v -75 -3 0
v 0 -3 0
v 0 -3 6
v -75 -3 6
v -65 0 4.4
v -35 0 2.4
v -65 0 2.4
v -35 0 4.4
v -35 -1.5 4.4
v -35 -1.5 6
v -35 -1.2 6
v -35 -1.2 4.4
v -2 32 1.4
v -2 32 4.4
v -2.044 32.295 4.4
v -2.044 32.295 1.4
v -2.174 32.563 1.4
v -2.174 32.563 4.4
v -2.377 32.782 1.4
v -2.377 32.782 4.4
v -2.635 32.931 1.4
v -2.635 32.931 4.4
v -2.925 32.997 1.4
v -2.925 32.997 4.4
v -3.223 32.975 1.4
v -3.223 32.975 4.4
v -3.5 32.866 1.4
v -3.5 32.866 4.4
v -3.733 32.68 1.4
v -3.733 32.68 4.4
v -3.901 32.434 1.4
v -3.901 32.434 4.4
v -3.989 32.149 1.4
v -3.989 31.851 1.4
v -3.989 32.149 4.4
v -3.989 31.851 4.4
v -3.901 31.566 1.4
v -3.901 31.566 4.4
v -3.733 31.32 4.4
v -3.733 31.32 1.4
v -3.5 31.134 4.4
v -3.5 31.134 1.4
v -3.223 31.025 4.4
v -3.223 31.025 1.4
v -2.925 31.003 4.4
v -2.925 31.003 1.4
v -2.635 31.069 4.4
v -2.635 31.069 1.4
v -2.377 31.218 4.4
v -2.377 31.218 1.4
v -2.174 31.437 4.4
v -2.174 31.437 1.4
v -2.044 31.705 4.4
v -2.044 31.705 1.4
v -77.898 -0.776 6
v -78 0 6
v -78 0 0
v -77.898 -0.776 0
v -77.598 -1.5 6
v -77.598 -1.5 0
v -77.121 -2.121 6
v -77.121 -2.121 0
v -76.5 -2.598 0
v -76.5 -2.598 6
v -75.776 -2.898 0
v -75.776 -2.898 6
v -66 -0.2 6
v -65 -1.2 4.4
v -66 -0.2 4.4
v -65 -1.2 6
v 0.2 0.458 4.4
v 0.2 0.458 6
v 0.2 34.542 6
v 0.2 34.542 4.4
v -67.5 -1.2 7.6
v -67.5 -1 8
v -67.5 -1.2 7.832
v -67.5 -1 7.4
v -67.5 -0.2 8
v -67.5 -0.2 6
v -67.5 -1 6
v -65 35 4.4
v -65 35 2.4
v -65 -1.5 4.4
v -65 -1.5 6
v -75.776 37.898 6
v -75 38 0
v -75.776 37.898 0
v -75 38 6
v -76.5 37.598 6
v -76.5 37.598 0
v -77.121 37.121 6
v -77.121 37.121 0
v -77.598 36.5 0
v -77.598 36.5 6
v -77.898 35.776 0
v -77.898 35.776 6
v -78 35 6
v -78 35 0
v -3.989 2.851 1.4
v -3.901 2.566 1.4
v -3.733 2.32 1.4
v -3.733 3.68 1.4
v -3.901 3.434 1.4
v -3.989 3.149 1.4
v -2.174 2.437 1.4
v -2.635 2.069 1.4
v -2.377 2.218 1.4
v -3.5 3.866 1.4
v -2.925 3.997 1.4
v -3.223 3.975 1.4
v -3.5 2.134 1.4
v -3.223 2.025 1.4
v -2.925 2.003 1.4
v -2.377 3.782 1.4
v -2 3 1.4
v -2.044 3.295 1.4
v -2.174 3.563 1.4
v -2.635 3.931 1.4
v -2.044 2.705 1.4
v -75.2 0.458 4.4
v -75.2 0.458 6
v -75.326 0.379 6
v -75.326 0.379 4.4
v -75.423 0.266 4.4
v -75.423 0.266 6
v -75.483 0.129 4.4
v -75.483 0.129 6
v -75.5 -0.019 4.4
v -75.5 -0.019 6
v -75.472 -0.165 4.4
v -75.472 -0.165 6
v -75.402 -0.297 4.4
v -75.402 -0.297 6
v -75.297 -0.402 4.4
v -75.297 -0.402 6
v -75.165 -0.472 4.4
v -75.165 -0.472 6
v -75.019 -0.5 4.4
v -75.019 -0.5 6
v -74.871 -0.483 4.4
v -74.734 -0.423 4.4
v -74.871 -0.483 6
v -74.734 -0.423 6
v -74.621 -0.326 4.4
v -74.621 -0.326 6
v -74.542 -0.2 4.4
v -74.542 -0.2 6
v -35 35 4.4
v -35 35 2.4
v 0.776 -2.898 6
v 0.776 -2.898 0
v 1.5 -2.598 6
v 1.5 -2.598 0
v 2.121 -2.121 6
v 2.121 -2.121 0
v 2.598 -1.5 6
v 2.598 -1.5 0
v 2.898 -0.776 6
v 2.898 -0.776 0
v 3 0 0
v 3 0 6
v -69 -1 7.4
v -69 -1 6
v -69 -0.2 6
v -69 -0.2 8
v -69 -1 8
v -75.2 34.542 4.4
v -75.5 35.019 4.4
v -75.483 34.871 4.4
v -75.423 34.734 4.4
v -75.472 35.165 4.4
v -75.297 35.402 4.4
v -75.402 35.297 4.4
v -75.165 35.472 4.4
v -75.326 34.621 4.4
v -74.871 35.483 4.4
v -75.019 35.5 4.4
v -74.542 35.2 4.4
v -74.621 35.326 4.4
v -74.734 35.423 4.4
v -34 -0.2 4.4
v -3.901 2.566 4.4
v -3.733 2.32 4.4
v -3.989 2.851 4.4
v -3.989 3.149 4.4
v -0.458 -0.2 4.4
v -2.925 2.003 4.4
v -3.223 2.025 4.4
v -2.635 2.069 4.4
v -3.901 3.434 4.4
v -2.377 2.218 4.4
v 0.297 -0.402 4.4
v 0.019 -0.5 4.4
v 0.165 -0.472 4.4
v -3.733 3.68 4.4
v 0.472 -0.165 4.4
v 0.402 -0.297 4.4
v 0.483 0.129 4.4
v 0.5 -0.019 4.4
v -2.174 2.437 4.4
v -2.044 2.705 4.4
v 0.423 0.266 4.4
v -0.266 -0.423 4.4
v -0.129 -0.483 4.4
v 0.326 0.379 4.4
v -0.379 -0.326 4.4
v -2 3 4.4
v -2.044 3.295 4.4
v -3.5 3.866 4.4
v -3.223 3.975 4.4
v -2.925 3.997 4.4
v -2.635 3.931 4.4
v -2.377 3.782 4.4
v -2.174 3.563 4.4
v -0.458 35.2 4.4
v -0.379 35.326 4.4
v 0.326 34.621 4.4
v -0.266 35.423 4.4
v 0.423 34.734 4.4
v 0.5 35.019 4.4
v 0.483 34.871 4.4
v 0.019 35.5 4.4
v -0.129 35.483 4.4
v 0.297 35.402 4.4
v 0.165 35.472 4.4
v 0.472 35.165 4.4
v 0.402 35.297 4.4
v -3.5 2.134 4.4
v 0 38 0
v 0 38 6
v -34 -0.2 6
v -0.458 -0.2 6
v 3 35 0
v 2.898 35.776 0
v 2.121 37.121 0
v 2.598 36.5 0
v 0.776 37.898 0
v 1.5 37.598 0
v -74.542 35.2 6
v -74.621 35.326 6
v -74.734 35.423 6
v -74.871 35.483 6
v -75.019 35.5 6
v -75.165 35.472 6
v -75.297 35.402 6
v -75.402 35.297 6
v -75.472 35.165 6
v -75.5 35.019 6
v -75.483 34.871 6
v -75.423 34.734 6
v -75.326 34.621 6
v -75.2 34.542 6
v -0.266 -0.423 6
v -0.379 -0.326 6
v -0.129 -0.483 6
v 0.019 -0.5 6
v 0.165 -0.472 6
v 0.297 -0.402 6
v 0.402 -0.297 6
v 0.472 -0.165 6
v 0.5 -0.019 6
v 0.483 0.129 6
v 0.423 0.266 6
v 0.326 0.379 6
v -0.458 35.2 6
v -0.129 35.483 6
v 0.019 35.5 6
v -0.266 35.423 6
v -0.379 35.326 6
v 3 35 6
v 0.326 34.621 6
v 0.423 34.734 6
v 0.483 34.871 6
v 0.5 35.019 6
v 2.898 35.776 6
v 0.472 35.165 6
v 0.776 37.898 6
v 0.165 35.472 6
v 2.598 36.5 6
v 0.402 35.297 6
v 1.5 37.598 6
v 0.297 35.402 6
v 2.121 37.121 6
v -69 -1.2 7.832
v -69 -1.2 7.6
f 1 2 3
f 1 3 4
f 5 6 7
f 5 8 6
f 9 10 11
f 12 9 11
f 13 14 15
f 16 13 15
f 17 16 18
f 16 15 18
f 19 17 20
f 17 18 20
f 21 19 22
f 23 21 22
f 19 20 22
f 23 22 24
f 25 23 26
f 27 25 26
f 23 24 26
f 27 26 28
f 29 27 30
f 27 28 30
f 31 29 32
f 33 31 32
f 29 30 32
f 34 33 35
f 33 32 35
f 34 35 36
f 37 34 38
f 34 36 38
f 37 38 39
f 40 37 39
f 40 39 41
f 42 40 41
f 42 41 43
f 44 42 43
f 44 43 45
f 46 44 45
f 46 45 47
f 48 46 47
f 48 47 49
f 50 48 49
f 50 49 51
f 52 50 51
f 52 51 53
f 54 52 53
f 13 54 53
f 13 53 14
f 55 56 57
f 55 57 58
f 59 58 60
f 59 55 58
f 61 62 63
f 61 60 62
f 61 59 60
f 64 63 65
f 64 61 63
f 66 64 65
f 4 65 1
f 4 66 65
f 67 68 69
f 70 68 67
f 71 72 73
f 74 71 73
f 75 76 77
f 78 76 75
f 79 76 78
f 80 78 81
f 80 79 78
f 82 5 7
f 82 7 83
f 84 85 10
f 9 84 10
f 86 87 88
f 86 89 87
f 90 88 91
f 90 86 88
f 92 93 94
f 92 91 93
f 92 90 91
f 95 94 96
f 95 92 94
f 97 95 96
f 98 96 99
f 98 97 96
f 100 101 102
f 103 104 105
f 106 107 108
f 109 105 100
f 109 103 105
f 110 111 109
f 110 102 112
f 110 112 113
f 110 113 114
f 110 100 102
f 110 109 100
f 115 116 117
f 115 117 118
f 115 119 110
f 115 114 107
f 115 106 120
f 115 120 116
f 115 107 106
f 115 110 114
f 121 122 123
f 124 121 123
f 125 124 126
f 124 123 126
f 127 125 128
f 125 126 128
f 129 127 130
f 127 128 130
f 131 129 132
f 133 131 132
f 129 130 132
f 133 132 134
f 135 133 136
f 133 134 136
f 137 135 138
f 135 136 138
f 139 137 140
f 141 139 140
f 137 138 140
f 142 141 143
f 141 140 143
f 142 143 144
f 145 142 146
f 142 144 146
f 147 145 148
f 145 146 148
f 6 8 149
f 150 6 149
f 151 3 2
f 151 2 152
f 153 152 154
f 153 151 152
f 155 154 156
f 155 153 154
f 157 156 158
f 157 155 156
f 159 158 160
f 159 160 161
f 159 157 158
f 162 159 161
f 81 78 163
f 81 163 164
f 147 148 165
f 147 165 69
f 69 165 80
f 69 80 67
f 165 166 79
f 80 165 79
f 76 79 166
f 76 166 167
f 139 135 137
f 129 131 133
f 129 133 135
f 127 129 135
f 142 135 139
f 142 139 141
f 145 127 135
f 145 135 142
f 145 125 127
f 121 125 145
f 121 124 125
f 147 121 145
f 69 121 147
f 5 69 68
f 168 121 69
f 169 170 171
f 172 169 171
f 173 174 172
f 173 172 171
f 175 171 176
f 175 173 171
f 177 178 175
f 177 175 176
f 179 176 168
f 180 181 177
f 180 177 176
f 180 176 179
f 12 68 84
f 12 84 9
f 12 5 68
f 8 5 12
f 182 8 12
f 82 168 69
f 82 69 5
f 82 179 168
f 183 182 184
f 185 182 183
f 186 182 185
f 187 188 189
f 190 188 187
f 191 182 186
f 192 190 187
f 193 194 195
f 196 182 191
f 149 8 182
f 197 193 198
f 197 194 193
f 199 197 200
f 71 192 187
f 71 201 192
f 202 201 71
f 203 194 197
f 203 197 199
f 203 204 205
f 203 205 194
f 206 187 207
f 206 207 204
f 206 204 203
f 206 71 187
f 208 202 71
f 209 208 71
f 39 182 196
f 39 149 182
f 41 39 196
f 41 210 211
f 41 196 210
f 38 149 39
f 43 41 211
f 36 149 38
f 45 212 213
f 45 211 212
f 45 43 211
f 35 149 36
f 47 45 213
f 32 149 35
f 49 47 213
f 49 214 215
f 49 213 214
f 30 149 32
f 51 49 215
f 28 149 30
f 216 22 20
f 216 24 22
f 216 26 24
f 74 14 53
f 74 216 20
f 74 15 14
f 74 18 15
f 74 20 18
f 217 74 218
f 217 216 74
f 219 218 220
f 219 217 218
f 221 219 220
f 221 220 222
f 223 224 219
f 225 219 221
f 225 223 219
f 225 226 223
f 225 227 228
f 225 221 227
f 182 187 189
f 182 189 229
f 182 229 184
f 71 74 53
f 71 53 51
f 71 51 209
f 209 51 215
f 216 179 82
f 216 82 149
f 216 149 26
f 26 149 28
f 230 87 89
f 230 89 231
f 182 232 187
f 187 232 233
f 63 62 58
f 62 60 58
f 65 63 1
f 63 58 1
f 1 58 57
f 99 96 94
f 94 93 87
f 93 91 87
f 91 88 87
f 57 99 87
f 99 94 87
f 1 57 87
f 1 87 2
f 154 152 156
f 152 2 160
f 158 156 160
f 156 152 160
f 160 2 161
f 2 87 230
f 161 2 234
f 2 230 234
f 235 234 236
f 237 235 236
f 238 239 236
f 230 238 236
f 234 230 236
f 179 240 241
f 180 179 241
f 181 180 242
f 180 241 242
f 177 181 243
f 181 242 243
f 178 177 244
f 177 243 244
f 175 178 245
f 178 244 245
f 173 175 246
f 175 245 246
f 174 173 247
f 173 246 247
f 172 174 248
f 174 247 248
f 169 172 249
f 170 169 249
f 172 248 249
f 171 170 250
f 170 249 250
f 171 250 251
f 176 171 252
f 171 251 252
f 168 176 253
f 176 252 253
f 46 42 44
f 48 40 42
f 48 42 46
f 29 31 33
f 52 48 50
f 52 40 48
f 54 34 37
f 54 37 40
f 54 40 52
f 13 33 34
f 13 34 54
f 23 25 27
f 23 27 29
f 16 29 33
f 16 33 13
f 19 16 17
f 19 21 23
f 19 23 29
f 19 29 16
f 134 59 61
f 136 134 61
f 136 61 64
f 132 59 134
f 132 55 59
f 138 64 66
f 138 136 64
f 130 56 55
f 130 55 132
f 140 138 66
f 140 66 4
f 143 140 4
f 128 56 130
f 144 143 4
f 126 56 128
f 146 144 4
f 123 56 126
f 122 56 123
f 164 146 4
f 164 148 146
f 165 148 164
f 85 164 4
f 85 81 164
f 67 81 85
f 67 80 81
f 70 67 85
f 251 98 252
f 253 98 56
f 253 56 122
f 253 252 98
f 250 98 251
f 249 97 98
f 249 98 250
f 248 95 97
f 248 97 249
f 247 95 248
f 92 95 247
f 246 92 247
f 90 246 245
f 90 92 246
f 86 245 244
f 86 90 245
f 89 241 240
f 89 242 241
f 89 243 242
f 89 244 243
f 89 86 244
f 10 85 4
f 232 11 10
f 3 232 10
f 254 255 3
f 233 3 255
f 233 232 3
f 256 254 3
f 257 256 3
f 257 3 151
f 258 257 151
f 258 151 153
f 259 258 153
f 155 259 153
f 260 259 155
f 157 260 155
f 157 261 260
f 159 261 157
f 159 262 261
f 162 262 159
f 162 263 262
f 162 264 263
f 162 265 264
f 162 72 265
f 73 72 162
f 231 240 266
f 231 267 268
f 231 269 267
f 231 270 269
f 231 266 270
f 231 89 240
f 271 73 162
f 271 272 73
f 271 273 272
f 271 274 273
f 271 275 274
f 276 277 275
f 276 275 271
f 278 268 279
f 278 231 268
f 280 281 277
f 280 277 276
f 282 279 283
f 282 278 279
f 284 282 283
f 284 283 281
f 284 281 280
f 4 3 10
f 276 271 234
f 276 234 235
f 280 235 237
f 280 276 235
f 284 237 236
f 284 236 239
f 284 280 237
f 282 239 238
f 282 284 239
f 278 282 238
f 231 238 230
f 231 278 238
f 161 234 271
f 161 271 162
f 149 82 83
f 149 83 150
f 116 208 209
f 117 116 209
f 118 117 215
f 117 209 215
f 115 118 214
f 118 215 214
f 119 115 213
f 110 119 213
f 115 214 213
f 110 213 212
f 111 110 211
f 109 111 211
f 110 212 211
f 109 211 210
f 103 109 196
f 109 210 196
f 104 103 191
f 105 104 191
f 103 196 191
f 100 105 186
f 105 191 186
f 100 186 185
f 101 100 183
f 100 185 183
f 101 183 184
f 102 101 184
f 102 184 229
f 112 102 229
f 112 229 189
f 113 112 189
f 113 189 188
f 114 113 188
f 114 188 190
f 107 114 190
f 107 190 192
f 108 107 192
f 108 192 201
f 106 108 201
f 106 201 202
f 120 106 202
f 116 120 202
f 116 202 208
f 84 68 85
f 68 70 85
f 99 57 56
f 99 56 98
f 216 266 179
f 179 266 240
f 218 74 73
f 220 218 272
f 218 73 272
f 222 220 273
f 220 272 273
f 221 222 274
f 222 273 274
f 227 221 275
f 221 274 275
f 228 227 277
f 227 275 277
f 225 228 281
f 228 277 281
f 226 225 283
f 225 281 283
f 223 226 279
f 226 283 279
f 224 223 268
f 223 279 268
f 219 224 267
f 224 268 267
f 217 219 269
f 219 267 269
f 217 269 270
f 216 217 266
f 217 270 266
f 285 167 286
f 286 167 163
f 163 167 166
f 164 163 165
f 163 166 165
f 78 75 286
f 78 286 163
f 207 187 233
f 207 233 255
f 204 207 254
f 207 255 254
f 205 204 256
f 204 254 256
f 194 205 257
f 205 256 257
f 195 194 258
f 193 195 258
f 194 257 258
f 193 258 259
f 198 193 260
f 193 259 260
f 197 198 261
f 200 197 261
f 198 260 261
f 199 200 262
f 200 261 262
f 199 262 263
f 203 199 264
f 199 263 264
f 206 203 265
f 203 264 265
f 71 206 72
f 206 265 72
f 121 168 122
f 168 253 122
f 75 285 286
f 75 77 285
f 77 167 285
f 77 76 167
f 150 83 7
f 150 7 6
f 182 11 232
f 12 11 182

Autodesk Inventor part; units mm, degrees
ref_plane "YZ Plane" through (0, 0, 0) normal (1, 0, 0) x (0, 1, 0)
ref_plane "XZ Plane" through (0, 0, 0) normal (0, 1, 0) x (-1, 0, 0)
ref_plane "XY Plane" through (0, 0, 0) normal (0, 0, 1) x (1, 0, 0)
sketch "Sketch1" plane through (0, 0, 0) normal (0, 0, 1) x (1, 0, 0)
  line L0 (0, 0) -> (-75, 0)
  line L1 (-75, 0) -> (-75, 35)
  line L2 (-75, 35) -> (0, 35)
  line L3 (0, 35) -> (0, 0)
  line L4 (3, -3) -> (-78, -3)
  line L5 (-78, -3) -> (-78, 38)
  line L6 (-78, 38) -> (3, 38)
  line L7 (3, 38) -> (3, -3)
  line L8 (-37.5, 38) -> (-37.5, 55.2273) construction
  line L9 (-78, 17.5) -> (-92.6498, 17.5) construction
  line L10 (-65, 0) -> (-65, 35)
  line L11 (-35, 0) -> (-35, 35)
  circle A0 centre (-3, 32) radius 1
  circle A1 centre (-3, 3) radius 1
  line L12 (-3, 3) -> (-3, 32) construction
  line L13 (-3, 17.5) -> (-10.1857, 17.5) construction
  circle A2 centre (-75, 35) radius 0.5
  circle A3 centre (0, 35) radius 0.5
  circle A4 centre (-75, 0) radius 0.5
  circle A5 centre (0, 0) radius 0.5
  line L14 (-75.2, 35.2) -> (-75.2, -0.2)
  line L15 (-75.2, -0.2) -> (0.2, -0.2)
  line L16 (0.2, -0.2) -> (0.2, 35.2)
  line L17 (0.2, 35.2) -> (-75.2, 35.2)
  line L18 (-65, 0) -> (-65, -1.5)
  line L19 (-65, -1.5) -> (-35, -1.5)
  line L20 (-35, -1.5) -> (-35, 0)
  point P0 (-0.5, 35)
  point P1 (0, 34.5)
  point P2 (0, 0.5)
  point P3 (-0.5, 0)
  point P4 (-75, 0.5)
  point P5 (-74.5, 0)
  point P6 (-74.5, 35)
  point P7 (-75, 34.5)
  point P8 (0.2, 0.4583)
  point P9 (0.2, 34.5417)
  point P10 (-0.4583, 35.2)
  point P11 (-74.5417, 35.2)
  point P12 (-74.5417, -0.2)
  point P13 (-0.4583, -0.2)
  point P14 (-75.2, 34.5417)
  point P15 (-75.2, 0.4583)
  point P16 (-35, -0.2)
  point P17 (-65, -0.2)
  dimension "d0" = 75
  dimension "d1" = 35
  dimension "d2" = 3
  dimension "d8" = 10
  dimension "d9" = 40
  dimension "d10" = 2
  dimension "d11" = 2
  dimension "d12" = 29
  dimension "d13" = 3
  dimension "d18" = 1
  dimension "d21" = 75
  dimension "d24" = 35
  dimension "d32" = 0.2
  dimension "d33" = 1.5
extrude "Extrusion1" add sketch "Sketch1" along normal blind 6 contours L20 L15 L18 L0 | L11 L2 A3 L3 A5 L0 | L0 L10 L2 L11 | L0 A5 L15 L20 | L18 L15 A4 L0 | L0 A4 L1 A2 L2 L10 | A5 L3 L0 | L0 L3 A5 L16 L15 | L2 A2 L17 A3 | L20 L19 L18 L15 | A4 L15 L14 L1 L0 | L0 L1 A4 | L3 A3 L16 A5 | L15 L16 A5 | A3 L17 L16 L3 L2 | L2 L3 A3 | A4 L14 A2 L1 | A4 L14 L15 | A2 L1 L2 | L2 L1 A2 L14 L17 | A3 L16 L17 | L17 L14 A2 | L4 L5 L6 L7 | A0 | A1
extrude "Extrusion2" cut sketch "Sketch1" against normal blind 1.6 from surface at 6 contours L20 L15 L18 L0 | L11 L2 A3 L3 A5 L0 | L0 L10 L2 L11 | L0 A5 L15 L20 | L18 L15 A4 L0 | L0 A4 L1 A2 L2 L10 | A5 L3 L0 | L0 L3 A5 L16 L15 | L2 A2 L17 A3 | L20 L19 L18 L15 | A4 L15 L14 L1 L0 | L0 L1 A4 | L3 A3 L16 A5 | L15 L16 A5 | A3 L17 L16 L3 L2 | L2 L3 A3 | A4 L14 A2 L1 | A4 L14 L15 | A2 L1 L2 | L2 L1 A2 L14 L17 | A3 L16 L17 | L17 L14 A2 | A0 | A1
extrude "Extrusion3" cut sketch "Sketch1" against normal blind 2 from surface at 4.4 contours L0 L10 L2 L11
extrude "Extrusion4" cut sketch "Sketch1" against normal blind 3 from surface at 4.4 contours A0 | A1
chamfer "Chamfer2" distance 1 angle 45 2 edges at (-65, -0.2, 5.2) (-35, -0.2, 5.2)
fillet "Fillet1" radius 3 4 edges at (3, 38, 3) (-78, 38, 3) (-78, -3, 3) (3, -3, 3)
ref_plane "Work Plane1" through (-37.5, 0, 0) normal (1, 0, 0) x (0, 0, -1)
sketch "Sketch2" plane through (-37.5, 0, 0) normal (1, 0, 0) x (0, 0, -1)
  line L0 (-2.4, 0) -> (-4.4, 0) projected
  line L1 (-4.4, 0) -> (-6, 0)
  line L2 (-6, -3) -> (-6, 0) projected
  line L3 (-6, -1.5) -> (-6, 0)
  line L4 (-8, -0.2) -> (-8, -1)
  line L5 (-8, -1) -> (-6, -1)
  line L6 (-8, -1) -> (-8, -1.2)
  line L7 (-8, -1.2) -> (-7.6, -1.2)
  line L8 (-7.6, -1.2) -> (-7.4, -1)
  line L9 (-8, -1) -> (-7.8322, -1.2)
  line L10 (-8, -0.2) -> (-6, -0.2)
  line L11 (-4.4, -0.2) -> (-6, -0.2) projected
  point P0 (0, 0)
  dimension "d41" = 0.8
  dimension "d42" = 0.2
  dimension "d45" = 45
  dimension "d46" = 50
  dimension "d47" = 0.4
  dimension "d51" = 2
ref_plane "Work Plane2" through (-67.5, 0, 0) normal (1, 0, 0) x (0, 0, -1)
extrude "Extrusion5" add sketch "Sketch2" against normal blind 1.5 from surface at -30 contours L5 L4 L10 L2 | L8 L7 L9 L5
equation "\"d11\" = d10"
equation "\"d21\" = d0"
equation "\"d24\" = d1"
properties part number "scatola_sotto"
